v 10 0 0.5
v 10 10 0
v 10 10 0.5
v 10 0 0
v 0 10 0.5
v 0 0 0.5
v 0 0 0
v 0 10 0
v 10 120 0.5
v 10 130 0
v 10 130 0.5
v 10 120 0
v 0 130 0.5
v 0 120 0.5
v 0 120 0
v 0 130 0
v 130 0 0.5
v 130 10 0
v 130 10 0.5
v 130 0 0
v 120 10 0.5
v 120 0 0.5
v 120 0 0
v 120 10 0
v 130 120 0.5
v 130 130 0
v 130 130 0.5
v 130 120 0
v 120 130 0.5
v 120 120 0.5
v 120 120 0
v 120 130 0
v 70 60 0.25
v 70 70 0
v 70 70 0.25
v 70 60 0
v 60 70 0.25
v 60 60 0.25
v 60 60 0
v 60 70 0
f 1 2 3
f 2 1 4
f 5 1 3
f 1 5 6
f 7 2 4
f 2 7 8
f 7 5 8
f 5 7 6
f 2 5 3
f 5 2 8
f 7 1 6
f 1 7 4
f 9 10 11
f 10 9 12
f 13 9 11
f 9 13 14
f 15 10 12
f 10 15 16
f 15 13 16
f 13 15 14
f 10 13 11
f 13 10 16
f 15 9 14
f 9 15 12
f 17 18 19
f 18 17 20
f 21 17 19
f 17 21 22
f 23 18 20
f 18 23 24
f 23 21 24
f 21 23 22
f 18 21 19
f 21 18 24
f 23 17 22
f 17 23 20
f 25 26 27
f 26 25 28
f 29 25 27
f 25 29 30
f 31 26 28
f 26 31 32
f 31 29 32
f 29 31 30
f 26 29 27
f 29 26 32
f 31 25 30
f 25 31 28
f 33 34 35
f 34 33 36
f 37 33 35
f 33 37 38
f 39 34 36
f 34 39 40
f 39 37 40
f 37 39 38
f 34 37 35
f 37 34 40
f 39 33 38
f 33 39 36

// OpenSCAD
translate([60, 60, 0])
cube(size = [10,10,0.25], center = false);




for (x = [0, 120], y = [0 , 120]) 
{
    translate([x, y, 0])
    cube(size = [ 10, 10, 0.5], center = false);
}
